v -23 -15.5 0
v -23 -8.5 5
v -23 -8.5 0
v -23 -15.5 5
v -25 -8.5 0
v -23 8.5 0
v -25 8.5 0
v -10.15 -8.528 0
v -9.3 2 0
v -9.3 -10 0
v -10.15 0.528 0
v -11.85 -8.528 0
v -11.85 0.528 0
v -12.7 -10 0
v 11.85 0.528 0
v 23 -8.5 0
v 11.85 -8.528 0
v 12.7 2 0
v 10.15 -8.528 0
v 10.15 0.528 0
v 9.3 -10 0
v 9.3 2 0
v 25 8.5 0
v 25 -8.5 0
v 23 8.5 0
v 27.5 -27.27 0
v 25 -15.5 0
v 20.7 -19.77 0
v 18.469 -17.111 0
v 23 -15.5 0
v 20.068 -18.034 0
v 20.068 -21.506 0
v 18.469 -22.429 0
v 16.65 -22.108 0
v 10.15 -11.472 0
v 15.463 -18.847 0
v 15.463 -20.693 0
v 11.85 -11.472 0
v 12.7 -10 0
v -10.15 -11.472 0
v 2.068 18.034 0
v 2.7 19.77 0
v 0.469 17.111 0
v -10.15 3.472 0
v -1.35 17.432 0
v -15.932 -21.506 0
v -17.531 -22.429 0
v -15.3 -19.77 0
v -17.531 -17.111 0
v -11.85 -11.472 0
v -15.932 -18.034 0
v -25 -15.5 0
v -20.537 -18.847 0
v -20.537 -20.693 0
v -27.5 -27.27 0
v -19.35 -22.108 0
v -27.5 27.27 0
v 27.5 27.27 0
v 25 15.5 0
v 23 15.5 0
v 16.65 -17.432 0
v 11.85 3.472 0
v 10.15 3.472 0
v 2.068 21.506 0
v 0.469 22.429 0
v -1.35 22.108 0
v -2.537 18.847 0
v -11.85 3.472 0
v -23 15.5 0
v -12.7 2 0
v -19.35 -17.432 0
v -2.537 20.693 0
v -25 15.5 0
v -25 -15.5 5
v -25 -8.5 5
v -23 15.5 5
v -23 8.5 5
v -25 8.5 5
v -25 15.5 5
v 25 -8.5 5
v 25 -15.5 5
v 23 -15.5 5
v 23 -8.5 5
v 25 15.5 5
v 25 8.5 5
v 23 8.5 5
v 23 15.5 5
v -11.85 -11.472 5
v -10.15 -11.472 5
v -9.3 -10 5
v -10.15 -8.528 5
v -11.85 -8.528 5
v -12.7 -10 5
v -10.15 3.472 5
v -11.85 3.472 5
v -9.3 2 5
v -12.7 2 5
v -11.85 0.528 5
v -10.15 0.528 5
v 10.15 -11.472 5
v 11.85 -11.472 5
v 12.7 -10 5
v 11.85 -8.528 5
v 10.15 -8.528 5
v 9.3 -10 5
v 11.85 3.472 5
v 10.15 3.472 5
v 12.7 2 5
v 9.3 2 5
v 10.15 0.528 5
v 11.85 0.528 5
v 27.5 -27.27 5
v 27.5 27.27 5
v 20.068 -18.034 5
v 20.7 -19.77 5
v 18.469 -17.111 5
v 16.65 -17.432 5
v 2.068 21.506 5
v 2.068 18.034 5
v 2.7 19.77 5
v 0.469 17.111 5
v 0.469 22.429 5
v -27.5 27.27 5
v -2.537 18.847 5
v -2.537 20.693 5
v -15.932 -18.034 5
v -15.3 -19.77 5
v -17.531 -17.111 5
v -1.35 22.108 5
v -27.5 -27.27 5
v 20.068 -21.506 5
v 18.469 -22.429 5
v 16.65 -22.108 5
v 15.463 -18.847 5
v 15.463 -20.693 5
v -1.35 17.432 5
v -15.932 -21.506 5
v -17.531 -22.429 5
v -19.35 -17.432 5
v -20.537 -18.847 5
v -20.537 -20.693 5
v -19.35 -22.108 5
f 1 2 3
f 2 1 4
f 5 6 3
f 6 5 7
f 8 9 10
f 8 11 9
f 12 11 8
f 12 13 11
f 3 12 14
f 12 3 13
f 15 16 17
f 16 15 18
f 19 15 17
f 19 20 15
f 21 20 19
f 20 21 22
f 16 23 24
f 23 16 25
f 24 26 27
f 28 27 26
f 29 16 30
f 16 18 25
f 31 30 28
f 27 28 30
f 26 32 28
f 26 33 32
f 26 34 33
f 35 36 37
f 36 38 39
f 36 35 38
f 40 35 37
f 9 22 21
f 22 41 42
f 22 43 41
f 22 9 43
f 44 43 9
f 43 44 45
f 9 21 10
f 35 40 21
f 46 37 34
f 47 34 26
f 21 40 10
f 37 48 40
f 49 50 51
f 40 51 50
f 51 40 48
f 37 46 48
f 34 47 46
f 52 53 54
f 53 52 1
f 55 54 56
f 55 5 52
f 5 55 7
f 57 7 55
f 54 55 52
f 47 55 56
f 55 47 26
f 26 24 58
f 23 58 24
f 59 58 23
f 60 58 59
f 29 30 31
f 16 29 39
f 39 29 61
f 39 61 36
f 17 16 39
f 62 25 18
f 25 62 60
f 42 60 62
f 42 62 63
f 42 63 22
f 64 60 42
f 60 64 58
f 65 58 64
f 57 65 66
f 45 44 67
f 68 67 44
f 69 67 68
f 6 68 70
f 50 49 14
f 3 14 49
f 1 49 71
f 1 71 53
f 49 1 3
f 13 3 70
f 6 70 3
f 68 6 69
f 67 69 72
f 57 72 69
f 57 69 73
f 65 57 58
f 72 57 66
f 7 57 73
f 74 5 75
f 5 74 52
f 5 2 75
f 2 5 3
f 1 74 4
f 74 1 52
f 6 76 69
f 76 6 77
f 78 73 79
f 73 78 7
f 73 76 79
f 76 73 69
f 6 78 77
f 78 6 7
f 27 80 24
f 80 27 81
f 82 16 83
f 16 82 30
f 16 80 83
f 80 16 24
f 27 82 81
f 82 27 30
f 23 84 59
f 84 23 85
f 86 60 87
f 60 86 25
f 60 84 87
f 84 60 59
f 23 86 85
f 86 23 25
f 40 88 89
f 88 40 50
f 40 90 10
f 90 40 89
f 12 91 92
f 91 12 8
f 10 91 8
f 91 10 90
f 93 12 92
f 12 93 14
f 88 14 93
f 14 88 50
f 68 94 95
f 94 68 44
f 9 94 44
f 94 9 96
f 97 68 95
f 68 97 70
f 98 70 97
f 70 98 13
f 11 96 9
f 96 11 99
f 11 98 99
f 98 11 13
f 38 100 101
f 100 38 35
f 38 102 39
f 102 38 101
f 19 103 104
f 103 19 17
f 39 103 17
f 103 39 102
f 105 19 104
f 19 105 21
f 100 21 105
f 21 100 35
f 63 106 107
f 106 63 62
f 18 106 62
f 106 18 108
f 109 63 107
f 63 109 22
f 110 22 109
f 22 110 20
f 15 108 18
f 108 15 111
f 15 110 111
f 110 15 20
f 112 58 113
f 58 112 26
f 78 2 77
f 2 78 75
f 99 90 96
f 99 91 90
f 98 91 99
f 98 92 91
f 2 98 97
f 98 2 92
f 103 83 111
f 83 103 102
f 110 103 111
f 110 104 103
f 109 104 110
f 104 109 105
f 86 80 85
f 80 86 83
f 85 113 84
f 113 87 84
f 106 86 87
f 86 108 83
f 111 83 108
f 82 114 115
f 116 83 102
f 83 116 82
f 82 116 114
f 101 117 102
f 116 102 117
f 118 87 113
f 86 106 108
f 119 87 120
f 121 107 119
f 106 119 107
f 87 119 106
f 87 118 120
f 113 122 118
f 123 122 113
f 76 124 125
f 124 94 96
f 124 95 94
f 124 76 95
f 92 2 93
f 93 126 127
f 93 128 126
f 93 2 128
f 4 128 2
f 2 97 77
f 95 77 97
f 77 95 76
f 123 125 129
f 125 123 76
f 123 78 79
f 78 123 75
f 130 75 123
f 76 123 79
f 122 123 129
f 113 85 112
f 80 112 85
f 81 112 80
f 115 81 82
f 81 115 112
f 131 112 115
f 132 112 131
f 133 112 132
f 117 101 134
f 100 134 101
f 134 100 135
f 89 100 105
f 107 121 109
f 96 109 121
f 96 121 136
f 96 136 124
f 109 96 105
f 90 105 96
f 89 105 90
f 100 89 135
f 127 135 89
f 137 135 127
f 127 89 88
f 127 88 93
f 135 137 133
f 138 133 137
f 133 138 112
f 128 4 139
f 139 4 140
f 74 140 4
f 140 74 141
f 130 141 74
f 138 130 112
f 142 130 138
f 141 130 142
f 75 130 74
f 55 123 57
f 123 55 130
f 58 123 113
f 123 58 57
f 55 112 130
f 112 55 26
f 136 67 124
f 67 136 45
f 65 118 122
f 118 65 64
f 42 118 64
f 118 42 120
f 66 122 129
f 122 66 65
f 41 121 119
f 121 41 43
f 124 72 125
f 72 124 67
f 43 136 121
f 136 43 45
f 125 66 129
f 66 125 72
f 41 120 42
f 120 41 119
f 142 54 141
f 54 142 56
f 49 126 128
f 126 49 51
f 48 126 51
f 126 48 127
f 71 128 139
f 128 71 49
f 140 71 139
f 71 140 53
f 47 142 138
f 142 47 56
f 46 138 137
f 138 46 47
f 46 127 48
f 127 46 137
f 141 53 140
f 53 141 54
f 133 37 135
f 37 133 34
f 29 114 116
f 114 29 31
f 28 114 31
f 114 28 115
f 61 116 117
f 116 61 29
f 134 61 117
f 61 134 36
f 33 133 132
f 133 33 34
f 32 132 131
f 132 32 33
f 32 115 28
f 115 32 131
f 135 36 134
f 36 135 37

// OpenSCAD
module inv_ext2020(l=20, teeth = [1, 1, 1, 1], depth=1.5, tolerance=0.2, thick=3, hole=0, support=[1,1], layer_height=0.3) {
{
    difference() {
      translate([0,0,l/2])
        cube([20+thick,20+thick,l], center=true);
      translate([0,0,thick])ext2020(l=l-thick, teeth=teeth, tolerance=tolerance, depth=depth);
      #translate([0, l+15+layer_height,(l/2)+(hole/2)]) rotate([90,0,0])cylinder(d=hole, h=25+thick*2);
      }
    }
}
module ext2020(l=20, teeth = [1, 1, 1, 1], depth=1.5, tolerance=0.2) {
  scale([1,1,1])translate([0,0,l/2])
  difference(){
    cube([20+tolerance,20+tolerance,l], center=true);
    scale([1,1,1]) {
        if (teeth[0] == 1)
        translate([10-((depth+tolerance)/2)+tolerance,0,0])cube([depth+tolerance,5.68-tolerance,l], center=true);
        if (teeth[1] == 1)
        translate([-10+((depth+tolerance)/2)-tolerance,0,0])cube([depth+tolerance,5.68-tolerance,l], center=true);
    }
    scale([1,1,1]) {
        if (teeth[2] == 1)
        translate([0,10-((depth+tolerance)/2)+tolerance,0])cube([5.68-tolerance,depth+tolerance,l], center=true);
        if (teeth[3] == 1)
        translate([0,-10+((depth+tolerance)/2)-tolerance,0])cube([5.68-tolerance,depth+tolerance,l], center=true);
      }
  }
}
function vwheel_r() = 9.77;
*translate([120,0,0])
rotate([0,-90,0]) {
difference(){
  import("./printrcore-slide1a.stl");
  translate([-3.5,0,8.5])mirror([0,0,1])ext2020(teeth=[0,0,0,0]);
}
translate([-3.5,0,8.5])mirror([0,0,1])inv_ext2020(teeth=[0,1,1,1]);
}

difference() {
  translate([0,0,2.5])cube([55,15+20+vwheel_r()*2, 5], center=true);
  translate([0,10+vwheel_r(),0]) cylinder(d=5.4, h=10);
  translate([-18,-(10+vwheel_r()),0]) cylinder(d=5.4, h=10);
  translate([18,-(10+vwheel_r()),0]) cylinder(d=5.4, h=10);
  for (i = [-1, 1])
    for (j = [-1,1])
      translate([i*24,j*12,3])
        cube([2,7,6], center=true);
  for (i = [-1, 1])
    for (j = [-1,1])
    translate([i*11,(j*((40-28)/2))-4,0])
      cylinder(d=3.4, h=10);

}
*translate([0,25,0])
rotate([90,0,0])import("smartcore-toolhead-1a.stl");
